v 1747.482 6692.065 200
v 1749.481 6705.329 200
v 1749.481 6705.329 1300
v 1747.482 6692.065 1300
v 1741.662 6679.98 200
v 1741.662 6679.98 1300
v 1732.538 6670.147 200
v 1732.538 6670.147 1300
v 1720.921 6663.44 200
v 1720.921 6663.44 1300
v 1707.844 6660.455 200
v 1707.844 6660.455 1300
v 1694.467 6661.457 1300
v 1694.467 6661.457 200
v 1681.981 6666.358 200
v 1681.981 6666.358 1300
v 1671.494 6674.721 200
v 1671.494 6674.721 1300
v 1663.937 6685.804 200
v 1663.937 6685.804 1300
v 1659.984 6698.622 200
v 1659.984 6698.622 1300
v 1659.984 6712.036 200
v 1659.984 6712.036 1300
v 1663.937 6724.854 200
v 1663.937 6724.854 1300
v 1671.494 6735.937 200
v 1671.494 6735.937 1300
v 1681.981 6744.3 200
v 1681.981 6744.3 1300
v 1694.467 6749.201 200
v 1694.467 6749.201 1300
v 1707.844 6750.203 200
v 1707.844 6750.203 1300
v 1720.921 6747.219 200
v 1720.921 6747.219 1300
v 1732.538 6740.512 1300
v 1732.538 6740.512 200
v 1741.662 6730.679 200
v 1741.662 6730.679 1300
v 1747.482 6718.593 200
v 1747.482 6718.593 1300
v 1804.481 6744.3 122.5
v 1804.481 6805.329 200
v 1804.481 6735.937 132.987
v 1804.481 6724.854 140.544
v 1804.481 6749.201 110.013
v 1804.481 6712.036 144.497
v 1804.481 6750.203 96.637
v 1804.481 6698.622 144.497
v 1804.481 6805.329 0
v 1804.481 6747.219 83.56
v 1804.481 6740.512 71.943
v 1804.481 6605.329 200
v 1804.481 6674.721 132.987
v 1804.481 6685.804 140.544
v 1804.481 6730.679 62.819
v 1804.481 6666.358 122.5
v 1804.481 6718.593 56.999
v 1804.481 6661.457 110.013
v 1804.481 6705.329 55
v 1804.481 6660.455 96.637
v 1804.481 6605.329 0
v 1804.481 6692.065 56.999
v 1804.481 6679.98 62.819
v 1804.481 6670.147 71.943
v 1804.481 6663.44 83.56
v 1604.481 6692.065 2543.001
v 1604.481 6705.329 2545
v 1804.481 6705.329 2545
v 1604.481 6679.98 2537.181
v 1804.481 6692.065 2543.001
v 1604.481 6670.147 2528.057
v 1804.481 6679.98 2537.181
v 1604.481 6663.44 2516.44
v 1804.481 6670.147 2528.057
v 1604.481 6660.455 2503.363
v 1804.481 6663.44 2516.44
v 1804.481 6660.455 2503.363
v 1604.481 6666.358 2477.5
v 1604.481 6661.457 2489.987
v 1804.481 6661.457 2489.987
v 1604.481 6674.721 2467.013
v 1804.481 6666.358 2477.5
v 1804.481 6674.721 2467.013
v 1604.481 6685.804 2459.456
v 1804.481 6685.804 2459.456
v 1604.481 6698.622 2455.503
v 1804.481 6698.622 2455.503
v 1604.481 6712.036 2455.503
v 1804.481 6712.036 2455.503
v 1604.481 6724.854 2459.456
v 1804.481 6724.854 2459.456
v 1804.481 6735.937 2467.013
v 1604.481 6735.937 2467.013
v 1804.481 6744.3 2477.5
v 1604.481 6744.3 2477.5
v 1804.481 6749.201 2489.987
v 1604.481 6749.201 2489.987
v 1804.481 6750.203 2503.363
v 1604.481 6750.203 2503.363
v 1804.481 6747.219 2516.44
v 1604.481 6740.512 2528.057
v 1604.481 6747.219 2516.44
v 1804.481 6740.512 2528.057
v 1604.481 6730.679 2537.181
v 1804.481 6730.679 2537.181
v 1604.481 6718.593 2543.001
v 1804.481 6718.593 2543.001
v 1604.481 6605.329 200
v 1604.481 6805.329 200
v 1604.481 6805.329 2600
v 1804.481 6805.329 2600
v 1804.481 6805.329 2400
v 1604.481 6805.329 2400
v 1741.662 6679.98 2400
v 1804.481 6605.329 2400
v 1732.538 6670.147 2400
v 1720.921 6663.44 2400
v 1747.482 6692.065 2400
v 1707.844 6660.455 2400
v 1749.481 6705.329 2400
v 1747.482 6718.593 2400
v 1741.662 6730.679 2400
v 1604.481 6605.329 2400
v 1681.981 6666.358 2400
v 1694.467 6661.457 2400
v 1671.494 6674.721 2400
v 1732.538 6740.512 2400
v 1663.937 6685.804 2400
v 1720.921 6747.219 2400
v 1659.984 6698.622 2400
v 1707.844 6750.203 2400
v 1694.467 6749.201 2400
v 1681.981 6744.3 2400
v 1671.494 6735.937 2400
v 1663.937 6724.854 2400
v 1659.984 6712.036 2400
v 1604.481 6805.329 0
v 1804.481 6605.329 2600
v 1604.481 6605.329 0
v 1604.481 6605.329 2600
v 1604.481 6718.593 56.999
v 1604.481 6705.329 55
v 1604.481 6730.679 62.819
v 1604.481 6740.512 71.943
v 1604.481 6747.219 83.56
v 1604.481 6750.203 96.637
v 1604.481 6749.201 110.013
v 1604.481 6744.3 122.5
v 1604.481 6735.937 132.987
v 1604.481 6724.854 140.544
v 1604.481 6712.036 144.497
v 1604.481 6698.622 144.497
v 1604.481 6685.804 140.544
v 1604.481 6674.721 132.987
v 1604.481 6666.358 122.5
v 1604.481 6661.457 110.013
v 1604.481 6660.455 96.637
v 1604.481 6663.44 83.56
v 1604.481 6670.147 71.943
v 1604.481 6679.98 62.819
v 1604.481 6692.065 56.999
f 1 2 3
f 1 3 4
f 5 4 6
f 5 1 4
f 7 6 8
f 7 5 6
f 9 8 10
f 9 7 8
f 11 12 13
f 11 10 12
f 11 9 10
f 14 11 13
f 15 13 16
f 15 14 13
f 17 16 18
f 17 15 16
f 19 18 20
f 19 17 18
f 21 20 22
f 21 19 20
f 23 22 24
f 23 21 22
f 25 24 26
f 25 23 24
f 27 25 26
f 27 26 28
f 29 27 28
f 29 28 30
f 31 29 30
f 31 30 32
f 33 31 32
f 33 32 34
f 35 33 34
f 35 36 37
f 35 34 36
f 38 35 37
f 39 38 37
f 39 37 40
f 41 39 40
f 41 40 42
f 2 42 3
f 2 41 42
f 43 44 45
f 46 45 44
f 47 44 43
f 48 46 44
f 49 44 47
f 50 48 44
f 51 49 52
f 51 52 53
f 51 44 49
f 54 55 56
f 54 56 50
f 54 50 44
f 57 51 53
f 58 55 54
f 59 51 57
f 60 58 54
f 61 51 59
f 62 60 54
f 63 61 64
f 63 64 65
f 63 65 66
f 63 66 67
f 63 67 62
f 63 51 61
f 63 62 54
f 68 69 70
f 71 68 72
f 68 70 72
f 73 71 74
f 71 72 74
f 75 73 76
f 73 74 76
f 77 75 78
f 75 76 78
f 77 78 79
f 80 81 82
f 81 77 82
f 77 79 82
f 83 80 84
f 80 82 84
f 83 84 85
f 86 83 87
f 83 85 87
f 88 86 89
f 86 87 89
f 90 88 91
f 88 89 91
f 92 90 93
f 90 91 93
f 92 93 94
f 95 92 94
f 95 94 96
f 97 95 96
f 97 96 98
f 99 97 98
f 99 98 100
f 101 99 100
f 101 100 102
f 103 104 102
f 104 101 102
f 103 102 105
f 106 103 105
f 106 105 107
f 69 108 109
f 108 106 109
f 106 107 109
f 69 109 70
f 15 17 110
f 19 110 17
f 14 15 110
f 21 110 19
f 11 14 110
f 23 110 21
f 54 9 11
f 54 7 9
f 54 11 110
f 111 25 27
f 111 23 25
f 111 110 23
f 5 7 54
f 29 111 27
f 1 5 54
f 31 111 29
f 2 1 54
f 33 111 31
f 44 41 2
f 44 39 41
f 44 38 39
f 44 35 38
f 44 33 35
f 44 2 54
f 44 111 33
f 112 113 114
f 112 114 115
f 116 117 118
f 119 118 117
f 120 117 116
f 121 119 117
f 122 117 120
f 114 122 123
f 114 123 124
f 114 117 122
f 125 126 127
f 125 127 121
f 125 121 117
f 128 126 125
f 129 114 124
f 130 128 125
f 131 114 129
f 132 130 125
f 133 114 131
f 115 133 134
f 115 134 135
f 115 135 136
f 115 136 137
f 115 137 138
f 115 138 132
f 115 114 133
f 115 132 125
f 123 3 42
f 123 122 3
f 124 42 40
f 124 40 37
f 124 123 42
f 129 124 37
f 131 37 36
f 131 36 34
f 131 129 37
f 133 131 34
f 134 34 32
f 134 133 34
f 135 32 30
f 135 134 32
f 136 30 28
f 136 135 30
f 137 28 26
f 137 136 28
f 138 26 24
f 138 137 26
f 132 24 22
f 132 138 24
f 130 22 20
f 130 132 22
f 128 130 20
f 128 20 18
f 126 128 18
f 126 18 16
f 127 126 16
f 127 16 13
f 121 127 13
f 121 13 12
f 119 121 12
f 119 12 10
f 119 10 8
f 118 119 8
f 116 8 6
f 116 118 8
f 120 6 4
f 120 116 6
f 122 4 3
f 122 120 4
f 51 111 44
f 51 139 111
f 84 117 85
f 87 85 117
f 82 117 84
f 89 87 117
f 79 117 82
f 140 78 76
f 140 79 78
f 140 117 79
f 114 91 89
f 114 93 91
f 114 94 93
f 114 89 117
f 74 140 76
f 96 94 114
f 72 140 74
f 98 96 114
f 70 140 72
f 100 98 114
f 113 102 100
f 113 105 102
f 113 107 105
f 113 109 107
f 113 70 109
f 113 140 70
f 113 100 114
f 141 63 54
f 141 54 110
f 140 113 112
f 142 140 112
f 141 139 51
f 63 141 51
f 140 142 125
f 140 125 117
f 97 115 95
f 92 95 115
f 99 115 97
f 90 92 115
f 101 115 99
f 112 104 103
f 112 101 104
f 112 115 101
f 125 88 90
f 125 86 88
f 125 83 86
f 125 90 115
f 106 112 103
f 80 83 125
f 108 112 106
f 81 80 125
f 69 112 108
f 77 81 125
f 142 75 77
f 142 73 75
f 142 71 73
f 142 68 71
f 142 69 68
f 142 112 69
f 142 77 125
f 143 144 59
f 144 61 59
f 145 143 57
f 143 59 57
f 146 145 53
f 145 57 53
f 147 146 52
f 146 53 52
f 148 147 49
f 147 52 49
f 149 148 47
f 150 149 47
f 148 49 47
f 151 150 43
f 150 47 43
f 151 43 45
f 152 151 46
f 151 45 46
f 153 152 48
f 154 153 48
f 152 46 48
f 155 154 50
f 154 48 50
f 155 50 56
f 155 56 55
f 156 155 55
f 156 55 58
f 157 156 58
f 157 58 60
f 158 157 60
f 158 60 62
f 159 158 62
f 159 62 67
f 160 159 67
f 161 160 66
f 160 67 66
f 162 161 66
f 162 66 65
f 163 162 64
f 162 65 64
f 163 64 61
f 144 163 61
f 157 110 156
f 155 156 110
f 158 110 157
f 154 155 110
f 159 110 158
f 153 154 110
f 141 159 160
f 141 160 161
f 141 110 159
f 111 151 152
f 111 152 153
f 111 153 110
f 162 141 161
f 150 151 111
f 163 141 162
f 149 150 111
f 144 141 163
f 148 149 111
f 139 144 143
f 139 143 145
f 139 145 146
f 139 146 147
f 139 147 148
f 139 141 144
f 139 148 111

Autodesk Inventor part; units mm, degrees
ref_plane "YZ Plane" through (0, 0, 0) normal (1, 0, 0) x (0, 1, 0)
ref_plane "XZ Plane" through (0, 0, 0) normal (0, 1, 0) x (-1, 0, 0)
ref_plane "XY Plane" through (0, 0, 0) normal (0, 0, 1) x (1, 0, 0)
sketch "Sketch1" plane through (0, 0, 0) normal (0, 0, 1) x (1, 0, 0)
  line L0 (1604.4809, 6805.3292) -> (1804.4809, 6805.3292)
  line L1 (1804.4809, 6805.3292) -> (1804.4809, 6605.3292)
  line L2 (1804.4809, 6605.3292) -> (1604.4809, 6605.3292)
  line L3 (1604.4809, 6605.3292) -> (1604.4809, 6805.3292)
  point P0 (0, 0)
  dimension "d0" = 200
  dimension "d1" = 200
extrude "Extrusion1" add sketch "Sketch1" along normal blind 200
sketch "Sketch2" plane through (0, 0, 200) normal (0, 0, 1) x (1, 0, 0)
  line L0 (1804.4809, 6805.3292) -> (1604.4809, 6805.3292) projected
  line L1 (1604.4809, 6605.3292) -> (1804.4809, 6605.3292) projected
  circle A0 centre (1704.4809, 6705.3292) radius 45
  point P0 (0, 0)
  dimension "d4" = 90
extrude "Extrusion2" add sketch "Sketch2" along normal blind 1100
sketch "Sketch4" plane through (1804.4809, 6605.3292, 0) normal (1, 0, 0) x (0, 0, -1)
  line L0 (0, 200) -> (-200, 200) projected
  line L1 (-100, 200) -> (-100, 0)
  line L2 (0, 0) -> (-200, 0) projected
  circle A0 centre (-100, 100) radius 45
  point P0 (0, -6605.3292)
  dimension "d12" = 90
extrude "Extrusion4" cut sketch "Sketch4" against normal blind 200
mirror "Mirror1" about plane through (1704.4809, 6705.3292, 1300) normal (0, 0, 1) of "Extrusion2", "Extrusion1", "Extrusion4"
thread "Thread1" size "M90x6" class "6g" standard "ISO Metric profile" full length
properties part number "srodek"
